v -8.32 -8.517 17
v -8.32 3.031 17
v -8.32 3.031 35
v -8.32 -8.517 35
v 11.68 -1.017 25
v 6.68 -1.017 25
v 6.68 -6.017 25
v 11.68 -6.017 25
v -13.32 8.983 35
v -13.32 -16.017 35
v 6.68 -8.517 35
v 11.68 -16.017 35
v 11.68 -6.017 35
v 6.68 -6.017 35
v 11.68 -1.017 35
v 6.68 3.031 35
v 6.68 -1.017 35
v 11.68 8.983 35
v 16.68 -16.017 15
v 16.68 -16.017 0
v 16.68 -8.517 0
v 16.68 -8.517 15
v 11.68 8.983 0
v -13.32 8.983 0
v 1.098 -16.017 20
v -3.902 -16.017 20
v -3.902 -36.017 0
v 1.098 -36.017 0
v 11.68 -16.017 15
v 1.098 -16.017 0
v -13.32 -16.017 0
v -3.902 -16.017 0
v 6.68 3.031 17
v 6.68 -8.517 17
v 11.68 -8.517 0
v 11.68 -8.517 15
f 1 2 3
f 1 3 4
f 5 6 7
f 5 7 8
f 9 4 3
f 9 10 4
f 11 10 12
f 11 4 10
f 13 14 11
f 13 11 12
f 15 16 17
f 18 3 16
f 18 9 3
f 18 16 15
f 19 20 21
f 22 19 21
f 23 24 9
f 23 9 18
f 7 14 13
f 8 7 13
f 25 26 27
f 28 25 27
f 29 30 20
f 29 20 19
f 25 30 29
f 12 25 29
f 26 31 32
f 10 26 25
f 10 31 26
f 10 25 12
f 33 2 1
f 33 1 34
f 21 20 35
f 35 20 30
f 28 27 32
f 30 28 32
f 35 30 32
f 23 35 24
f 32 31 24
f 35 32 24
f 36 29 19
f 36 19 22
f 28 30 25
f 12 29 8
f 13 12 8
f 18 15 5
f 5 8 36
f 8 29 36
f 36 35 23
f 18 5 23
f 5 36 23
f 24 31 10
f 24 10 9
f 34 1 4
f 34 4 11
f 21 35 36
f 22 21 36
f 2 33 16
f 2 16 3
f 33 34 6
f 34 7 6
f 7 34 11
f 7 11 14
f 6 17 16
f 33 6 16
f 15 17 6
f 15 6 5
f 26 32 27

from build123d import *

# Parameters (mm, degrees)
F0_W      = 25
F0_H      = 25
F1_DEPTH  = 35
F2_W      = 7.5
F2_H      = 15
F3_DEPTH  = 5
F4_W      = 5
F4_H      = 5
F5_DEPTH  = 10
F7_DEPTH  = 18
F8_W      = 5
F8_H      = 20
F9_DEPTH  = 20
F11_DEPTH = 29.5


with BuildPart() as f1:
    # F0 (on Top) → F1 (new body)
    with BuildSketch(Plane.XY):
        with Locations((-0.820497, -3.517498)):
            Rectangle(F0_W, F0_H)
    extrude(amount=F1_DEPTH)

    # F2 (on face) → F3 (join)
    with BuildSketch(Plane.YZ.offset(11.679503)):
        with Locations((-12.267498, 7.5)):
            Rectangle(F2_W, F2_H)
    extrude(amount=F3_DEPTH)

    # F4 (on face) → F5 (cut)
    with BuildSketch(Plane.XY.offset(35)):
        with Locations((9.179503, -3.517498)):
            Rectangle(F4_W, F4_H)
    extrude(amount=-F5_DEPTH, mode=Mode.SUBTRACT)

    # F6 (on face) → F7 (cut)
    with BuildSketch(Plane.XY.offset(35)):
        Polygon((6.679503, 3.030628), (-8.320497, 3.030628), (-8.320497, -8.517498), (6.679503, -8.517498), (6.679503, -6.017498), (6.679503, -1.017498), align=None)
    extrude(amount=-F7_DEPTH, mode=Mode.SUBTRACT)

    # F8 (on face) → F9 (join)
    with BuildSketch(Plane.XZ.offset(16.017498)):
        with Locations((-1.402237, 10)):
            Rectangle(F8_W, F8_H)
    extrude(amount=F9_DEPTH)

    # F10 (on face) → F11 (cut)
    with BuildSketch(Plane(origin=(-3.902237, 0, 0), x_dir=(0, -1, 0), z_dir=(-1, 0, 0))):
        Polygon((36.017498, 20), (16.017498, 20), (36.017498, 0), align=None)
    extrude(amount=-F11_DEPTH, mode=Mode.SUBTRACT)


solid = f1.part
